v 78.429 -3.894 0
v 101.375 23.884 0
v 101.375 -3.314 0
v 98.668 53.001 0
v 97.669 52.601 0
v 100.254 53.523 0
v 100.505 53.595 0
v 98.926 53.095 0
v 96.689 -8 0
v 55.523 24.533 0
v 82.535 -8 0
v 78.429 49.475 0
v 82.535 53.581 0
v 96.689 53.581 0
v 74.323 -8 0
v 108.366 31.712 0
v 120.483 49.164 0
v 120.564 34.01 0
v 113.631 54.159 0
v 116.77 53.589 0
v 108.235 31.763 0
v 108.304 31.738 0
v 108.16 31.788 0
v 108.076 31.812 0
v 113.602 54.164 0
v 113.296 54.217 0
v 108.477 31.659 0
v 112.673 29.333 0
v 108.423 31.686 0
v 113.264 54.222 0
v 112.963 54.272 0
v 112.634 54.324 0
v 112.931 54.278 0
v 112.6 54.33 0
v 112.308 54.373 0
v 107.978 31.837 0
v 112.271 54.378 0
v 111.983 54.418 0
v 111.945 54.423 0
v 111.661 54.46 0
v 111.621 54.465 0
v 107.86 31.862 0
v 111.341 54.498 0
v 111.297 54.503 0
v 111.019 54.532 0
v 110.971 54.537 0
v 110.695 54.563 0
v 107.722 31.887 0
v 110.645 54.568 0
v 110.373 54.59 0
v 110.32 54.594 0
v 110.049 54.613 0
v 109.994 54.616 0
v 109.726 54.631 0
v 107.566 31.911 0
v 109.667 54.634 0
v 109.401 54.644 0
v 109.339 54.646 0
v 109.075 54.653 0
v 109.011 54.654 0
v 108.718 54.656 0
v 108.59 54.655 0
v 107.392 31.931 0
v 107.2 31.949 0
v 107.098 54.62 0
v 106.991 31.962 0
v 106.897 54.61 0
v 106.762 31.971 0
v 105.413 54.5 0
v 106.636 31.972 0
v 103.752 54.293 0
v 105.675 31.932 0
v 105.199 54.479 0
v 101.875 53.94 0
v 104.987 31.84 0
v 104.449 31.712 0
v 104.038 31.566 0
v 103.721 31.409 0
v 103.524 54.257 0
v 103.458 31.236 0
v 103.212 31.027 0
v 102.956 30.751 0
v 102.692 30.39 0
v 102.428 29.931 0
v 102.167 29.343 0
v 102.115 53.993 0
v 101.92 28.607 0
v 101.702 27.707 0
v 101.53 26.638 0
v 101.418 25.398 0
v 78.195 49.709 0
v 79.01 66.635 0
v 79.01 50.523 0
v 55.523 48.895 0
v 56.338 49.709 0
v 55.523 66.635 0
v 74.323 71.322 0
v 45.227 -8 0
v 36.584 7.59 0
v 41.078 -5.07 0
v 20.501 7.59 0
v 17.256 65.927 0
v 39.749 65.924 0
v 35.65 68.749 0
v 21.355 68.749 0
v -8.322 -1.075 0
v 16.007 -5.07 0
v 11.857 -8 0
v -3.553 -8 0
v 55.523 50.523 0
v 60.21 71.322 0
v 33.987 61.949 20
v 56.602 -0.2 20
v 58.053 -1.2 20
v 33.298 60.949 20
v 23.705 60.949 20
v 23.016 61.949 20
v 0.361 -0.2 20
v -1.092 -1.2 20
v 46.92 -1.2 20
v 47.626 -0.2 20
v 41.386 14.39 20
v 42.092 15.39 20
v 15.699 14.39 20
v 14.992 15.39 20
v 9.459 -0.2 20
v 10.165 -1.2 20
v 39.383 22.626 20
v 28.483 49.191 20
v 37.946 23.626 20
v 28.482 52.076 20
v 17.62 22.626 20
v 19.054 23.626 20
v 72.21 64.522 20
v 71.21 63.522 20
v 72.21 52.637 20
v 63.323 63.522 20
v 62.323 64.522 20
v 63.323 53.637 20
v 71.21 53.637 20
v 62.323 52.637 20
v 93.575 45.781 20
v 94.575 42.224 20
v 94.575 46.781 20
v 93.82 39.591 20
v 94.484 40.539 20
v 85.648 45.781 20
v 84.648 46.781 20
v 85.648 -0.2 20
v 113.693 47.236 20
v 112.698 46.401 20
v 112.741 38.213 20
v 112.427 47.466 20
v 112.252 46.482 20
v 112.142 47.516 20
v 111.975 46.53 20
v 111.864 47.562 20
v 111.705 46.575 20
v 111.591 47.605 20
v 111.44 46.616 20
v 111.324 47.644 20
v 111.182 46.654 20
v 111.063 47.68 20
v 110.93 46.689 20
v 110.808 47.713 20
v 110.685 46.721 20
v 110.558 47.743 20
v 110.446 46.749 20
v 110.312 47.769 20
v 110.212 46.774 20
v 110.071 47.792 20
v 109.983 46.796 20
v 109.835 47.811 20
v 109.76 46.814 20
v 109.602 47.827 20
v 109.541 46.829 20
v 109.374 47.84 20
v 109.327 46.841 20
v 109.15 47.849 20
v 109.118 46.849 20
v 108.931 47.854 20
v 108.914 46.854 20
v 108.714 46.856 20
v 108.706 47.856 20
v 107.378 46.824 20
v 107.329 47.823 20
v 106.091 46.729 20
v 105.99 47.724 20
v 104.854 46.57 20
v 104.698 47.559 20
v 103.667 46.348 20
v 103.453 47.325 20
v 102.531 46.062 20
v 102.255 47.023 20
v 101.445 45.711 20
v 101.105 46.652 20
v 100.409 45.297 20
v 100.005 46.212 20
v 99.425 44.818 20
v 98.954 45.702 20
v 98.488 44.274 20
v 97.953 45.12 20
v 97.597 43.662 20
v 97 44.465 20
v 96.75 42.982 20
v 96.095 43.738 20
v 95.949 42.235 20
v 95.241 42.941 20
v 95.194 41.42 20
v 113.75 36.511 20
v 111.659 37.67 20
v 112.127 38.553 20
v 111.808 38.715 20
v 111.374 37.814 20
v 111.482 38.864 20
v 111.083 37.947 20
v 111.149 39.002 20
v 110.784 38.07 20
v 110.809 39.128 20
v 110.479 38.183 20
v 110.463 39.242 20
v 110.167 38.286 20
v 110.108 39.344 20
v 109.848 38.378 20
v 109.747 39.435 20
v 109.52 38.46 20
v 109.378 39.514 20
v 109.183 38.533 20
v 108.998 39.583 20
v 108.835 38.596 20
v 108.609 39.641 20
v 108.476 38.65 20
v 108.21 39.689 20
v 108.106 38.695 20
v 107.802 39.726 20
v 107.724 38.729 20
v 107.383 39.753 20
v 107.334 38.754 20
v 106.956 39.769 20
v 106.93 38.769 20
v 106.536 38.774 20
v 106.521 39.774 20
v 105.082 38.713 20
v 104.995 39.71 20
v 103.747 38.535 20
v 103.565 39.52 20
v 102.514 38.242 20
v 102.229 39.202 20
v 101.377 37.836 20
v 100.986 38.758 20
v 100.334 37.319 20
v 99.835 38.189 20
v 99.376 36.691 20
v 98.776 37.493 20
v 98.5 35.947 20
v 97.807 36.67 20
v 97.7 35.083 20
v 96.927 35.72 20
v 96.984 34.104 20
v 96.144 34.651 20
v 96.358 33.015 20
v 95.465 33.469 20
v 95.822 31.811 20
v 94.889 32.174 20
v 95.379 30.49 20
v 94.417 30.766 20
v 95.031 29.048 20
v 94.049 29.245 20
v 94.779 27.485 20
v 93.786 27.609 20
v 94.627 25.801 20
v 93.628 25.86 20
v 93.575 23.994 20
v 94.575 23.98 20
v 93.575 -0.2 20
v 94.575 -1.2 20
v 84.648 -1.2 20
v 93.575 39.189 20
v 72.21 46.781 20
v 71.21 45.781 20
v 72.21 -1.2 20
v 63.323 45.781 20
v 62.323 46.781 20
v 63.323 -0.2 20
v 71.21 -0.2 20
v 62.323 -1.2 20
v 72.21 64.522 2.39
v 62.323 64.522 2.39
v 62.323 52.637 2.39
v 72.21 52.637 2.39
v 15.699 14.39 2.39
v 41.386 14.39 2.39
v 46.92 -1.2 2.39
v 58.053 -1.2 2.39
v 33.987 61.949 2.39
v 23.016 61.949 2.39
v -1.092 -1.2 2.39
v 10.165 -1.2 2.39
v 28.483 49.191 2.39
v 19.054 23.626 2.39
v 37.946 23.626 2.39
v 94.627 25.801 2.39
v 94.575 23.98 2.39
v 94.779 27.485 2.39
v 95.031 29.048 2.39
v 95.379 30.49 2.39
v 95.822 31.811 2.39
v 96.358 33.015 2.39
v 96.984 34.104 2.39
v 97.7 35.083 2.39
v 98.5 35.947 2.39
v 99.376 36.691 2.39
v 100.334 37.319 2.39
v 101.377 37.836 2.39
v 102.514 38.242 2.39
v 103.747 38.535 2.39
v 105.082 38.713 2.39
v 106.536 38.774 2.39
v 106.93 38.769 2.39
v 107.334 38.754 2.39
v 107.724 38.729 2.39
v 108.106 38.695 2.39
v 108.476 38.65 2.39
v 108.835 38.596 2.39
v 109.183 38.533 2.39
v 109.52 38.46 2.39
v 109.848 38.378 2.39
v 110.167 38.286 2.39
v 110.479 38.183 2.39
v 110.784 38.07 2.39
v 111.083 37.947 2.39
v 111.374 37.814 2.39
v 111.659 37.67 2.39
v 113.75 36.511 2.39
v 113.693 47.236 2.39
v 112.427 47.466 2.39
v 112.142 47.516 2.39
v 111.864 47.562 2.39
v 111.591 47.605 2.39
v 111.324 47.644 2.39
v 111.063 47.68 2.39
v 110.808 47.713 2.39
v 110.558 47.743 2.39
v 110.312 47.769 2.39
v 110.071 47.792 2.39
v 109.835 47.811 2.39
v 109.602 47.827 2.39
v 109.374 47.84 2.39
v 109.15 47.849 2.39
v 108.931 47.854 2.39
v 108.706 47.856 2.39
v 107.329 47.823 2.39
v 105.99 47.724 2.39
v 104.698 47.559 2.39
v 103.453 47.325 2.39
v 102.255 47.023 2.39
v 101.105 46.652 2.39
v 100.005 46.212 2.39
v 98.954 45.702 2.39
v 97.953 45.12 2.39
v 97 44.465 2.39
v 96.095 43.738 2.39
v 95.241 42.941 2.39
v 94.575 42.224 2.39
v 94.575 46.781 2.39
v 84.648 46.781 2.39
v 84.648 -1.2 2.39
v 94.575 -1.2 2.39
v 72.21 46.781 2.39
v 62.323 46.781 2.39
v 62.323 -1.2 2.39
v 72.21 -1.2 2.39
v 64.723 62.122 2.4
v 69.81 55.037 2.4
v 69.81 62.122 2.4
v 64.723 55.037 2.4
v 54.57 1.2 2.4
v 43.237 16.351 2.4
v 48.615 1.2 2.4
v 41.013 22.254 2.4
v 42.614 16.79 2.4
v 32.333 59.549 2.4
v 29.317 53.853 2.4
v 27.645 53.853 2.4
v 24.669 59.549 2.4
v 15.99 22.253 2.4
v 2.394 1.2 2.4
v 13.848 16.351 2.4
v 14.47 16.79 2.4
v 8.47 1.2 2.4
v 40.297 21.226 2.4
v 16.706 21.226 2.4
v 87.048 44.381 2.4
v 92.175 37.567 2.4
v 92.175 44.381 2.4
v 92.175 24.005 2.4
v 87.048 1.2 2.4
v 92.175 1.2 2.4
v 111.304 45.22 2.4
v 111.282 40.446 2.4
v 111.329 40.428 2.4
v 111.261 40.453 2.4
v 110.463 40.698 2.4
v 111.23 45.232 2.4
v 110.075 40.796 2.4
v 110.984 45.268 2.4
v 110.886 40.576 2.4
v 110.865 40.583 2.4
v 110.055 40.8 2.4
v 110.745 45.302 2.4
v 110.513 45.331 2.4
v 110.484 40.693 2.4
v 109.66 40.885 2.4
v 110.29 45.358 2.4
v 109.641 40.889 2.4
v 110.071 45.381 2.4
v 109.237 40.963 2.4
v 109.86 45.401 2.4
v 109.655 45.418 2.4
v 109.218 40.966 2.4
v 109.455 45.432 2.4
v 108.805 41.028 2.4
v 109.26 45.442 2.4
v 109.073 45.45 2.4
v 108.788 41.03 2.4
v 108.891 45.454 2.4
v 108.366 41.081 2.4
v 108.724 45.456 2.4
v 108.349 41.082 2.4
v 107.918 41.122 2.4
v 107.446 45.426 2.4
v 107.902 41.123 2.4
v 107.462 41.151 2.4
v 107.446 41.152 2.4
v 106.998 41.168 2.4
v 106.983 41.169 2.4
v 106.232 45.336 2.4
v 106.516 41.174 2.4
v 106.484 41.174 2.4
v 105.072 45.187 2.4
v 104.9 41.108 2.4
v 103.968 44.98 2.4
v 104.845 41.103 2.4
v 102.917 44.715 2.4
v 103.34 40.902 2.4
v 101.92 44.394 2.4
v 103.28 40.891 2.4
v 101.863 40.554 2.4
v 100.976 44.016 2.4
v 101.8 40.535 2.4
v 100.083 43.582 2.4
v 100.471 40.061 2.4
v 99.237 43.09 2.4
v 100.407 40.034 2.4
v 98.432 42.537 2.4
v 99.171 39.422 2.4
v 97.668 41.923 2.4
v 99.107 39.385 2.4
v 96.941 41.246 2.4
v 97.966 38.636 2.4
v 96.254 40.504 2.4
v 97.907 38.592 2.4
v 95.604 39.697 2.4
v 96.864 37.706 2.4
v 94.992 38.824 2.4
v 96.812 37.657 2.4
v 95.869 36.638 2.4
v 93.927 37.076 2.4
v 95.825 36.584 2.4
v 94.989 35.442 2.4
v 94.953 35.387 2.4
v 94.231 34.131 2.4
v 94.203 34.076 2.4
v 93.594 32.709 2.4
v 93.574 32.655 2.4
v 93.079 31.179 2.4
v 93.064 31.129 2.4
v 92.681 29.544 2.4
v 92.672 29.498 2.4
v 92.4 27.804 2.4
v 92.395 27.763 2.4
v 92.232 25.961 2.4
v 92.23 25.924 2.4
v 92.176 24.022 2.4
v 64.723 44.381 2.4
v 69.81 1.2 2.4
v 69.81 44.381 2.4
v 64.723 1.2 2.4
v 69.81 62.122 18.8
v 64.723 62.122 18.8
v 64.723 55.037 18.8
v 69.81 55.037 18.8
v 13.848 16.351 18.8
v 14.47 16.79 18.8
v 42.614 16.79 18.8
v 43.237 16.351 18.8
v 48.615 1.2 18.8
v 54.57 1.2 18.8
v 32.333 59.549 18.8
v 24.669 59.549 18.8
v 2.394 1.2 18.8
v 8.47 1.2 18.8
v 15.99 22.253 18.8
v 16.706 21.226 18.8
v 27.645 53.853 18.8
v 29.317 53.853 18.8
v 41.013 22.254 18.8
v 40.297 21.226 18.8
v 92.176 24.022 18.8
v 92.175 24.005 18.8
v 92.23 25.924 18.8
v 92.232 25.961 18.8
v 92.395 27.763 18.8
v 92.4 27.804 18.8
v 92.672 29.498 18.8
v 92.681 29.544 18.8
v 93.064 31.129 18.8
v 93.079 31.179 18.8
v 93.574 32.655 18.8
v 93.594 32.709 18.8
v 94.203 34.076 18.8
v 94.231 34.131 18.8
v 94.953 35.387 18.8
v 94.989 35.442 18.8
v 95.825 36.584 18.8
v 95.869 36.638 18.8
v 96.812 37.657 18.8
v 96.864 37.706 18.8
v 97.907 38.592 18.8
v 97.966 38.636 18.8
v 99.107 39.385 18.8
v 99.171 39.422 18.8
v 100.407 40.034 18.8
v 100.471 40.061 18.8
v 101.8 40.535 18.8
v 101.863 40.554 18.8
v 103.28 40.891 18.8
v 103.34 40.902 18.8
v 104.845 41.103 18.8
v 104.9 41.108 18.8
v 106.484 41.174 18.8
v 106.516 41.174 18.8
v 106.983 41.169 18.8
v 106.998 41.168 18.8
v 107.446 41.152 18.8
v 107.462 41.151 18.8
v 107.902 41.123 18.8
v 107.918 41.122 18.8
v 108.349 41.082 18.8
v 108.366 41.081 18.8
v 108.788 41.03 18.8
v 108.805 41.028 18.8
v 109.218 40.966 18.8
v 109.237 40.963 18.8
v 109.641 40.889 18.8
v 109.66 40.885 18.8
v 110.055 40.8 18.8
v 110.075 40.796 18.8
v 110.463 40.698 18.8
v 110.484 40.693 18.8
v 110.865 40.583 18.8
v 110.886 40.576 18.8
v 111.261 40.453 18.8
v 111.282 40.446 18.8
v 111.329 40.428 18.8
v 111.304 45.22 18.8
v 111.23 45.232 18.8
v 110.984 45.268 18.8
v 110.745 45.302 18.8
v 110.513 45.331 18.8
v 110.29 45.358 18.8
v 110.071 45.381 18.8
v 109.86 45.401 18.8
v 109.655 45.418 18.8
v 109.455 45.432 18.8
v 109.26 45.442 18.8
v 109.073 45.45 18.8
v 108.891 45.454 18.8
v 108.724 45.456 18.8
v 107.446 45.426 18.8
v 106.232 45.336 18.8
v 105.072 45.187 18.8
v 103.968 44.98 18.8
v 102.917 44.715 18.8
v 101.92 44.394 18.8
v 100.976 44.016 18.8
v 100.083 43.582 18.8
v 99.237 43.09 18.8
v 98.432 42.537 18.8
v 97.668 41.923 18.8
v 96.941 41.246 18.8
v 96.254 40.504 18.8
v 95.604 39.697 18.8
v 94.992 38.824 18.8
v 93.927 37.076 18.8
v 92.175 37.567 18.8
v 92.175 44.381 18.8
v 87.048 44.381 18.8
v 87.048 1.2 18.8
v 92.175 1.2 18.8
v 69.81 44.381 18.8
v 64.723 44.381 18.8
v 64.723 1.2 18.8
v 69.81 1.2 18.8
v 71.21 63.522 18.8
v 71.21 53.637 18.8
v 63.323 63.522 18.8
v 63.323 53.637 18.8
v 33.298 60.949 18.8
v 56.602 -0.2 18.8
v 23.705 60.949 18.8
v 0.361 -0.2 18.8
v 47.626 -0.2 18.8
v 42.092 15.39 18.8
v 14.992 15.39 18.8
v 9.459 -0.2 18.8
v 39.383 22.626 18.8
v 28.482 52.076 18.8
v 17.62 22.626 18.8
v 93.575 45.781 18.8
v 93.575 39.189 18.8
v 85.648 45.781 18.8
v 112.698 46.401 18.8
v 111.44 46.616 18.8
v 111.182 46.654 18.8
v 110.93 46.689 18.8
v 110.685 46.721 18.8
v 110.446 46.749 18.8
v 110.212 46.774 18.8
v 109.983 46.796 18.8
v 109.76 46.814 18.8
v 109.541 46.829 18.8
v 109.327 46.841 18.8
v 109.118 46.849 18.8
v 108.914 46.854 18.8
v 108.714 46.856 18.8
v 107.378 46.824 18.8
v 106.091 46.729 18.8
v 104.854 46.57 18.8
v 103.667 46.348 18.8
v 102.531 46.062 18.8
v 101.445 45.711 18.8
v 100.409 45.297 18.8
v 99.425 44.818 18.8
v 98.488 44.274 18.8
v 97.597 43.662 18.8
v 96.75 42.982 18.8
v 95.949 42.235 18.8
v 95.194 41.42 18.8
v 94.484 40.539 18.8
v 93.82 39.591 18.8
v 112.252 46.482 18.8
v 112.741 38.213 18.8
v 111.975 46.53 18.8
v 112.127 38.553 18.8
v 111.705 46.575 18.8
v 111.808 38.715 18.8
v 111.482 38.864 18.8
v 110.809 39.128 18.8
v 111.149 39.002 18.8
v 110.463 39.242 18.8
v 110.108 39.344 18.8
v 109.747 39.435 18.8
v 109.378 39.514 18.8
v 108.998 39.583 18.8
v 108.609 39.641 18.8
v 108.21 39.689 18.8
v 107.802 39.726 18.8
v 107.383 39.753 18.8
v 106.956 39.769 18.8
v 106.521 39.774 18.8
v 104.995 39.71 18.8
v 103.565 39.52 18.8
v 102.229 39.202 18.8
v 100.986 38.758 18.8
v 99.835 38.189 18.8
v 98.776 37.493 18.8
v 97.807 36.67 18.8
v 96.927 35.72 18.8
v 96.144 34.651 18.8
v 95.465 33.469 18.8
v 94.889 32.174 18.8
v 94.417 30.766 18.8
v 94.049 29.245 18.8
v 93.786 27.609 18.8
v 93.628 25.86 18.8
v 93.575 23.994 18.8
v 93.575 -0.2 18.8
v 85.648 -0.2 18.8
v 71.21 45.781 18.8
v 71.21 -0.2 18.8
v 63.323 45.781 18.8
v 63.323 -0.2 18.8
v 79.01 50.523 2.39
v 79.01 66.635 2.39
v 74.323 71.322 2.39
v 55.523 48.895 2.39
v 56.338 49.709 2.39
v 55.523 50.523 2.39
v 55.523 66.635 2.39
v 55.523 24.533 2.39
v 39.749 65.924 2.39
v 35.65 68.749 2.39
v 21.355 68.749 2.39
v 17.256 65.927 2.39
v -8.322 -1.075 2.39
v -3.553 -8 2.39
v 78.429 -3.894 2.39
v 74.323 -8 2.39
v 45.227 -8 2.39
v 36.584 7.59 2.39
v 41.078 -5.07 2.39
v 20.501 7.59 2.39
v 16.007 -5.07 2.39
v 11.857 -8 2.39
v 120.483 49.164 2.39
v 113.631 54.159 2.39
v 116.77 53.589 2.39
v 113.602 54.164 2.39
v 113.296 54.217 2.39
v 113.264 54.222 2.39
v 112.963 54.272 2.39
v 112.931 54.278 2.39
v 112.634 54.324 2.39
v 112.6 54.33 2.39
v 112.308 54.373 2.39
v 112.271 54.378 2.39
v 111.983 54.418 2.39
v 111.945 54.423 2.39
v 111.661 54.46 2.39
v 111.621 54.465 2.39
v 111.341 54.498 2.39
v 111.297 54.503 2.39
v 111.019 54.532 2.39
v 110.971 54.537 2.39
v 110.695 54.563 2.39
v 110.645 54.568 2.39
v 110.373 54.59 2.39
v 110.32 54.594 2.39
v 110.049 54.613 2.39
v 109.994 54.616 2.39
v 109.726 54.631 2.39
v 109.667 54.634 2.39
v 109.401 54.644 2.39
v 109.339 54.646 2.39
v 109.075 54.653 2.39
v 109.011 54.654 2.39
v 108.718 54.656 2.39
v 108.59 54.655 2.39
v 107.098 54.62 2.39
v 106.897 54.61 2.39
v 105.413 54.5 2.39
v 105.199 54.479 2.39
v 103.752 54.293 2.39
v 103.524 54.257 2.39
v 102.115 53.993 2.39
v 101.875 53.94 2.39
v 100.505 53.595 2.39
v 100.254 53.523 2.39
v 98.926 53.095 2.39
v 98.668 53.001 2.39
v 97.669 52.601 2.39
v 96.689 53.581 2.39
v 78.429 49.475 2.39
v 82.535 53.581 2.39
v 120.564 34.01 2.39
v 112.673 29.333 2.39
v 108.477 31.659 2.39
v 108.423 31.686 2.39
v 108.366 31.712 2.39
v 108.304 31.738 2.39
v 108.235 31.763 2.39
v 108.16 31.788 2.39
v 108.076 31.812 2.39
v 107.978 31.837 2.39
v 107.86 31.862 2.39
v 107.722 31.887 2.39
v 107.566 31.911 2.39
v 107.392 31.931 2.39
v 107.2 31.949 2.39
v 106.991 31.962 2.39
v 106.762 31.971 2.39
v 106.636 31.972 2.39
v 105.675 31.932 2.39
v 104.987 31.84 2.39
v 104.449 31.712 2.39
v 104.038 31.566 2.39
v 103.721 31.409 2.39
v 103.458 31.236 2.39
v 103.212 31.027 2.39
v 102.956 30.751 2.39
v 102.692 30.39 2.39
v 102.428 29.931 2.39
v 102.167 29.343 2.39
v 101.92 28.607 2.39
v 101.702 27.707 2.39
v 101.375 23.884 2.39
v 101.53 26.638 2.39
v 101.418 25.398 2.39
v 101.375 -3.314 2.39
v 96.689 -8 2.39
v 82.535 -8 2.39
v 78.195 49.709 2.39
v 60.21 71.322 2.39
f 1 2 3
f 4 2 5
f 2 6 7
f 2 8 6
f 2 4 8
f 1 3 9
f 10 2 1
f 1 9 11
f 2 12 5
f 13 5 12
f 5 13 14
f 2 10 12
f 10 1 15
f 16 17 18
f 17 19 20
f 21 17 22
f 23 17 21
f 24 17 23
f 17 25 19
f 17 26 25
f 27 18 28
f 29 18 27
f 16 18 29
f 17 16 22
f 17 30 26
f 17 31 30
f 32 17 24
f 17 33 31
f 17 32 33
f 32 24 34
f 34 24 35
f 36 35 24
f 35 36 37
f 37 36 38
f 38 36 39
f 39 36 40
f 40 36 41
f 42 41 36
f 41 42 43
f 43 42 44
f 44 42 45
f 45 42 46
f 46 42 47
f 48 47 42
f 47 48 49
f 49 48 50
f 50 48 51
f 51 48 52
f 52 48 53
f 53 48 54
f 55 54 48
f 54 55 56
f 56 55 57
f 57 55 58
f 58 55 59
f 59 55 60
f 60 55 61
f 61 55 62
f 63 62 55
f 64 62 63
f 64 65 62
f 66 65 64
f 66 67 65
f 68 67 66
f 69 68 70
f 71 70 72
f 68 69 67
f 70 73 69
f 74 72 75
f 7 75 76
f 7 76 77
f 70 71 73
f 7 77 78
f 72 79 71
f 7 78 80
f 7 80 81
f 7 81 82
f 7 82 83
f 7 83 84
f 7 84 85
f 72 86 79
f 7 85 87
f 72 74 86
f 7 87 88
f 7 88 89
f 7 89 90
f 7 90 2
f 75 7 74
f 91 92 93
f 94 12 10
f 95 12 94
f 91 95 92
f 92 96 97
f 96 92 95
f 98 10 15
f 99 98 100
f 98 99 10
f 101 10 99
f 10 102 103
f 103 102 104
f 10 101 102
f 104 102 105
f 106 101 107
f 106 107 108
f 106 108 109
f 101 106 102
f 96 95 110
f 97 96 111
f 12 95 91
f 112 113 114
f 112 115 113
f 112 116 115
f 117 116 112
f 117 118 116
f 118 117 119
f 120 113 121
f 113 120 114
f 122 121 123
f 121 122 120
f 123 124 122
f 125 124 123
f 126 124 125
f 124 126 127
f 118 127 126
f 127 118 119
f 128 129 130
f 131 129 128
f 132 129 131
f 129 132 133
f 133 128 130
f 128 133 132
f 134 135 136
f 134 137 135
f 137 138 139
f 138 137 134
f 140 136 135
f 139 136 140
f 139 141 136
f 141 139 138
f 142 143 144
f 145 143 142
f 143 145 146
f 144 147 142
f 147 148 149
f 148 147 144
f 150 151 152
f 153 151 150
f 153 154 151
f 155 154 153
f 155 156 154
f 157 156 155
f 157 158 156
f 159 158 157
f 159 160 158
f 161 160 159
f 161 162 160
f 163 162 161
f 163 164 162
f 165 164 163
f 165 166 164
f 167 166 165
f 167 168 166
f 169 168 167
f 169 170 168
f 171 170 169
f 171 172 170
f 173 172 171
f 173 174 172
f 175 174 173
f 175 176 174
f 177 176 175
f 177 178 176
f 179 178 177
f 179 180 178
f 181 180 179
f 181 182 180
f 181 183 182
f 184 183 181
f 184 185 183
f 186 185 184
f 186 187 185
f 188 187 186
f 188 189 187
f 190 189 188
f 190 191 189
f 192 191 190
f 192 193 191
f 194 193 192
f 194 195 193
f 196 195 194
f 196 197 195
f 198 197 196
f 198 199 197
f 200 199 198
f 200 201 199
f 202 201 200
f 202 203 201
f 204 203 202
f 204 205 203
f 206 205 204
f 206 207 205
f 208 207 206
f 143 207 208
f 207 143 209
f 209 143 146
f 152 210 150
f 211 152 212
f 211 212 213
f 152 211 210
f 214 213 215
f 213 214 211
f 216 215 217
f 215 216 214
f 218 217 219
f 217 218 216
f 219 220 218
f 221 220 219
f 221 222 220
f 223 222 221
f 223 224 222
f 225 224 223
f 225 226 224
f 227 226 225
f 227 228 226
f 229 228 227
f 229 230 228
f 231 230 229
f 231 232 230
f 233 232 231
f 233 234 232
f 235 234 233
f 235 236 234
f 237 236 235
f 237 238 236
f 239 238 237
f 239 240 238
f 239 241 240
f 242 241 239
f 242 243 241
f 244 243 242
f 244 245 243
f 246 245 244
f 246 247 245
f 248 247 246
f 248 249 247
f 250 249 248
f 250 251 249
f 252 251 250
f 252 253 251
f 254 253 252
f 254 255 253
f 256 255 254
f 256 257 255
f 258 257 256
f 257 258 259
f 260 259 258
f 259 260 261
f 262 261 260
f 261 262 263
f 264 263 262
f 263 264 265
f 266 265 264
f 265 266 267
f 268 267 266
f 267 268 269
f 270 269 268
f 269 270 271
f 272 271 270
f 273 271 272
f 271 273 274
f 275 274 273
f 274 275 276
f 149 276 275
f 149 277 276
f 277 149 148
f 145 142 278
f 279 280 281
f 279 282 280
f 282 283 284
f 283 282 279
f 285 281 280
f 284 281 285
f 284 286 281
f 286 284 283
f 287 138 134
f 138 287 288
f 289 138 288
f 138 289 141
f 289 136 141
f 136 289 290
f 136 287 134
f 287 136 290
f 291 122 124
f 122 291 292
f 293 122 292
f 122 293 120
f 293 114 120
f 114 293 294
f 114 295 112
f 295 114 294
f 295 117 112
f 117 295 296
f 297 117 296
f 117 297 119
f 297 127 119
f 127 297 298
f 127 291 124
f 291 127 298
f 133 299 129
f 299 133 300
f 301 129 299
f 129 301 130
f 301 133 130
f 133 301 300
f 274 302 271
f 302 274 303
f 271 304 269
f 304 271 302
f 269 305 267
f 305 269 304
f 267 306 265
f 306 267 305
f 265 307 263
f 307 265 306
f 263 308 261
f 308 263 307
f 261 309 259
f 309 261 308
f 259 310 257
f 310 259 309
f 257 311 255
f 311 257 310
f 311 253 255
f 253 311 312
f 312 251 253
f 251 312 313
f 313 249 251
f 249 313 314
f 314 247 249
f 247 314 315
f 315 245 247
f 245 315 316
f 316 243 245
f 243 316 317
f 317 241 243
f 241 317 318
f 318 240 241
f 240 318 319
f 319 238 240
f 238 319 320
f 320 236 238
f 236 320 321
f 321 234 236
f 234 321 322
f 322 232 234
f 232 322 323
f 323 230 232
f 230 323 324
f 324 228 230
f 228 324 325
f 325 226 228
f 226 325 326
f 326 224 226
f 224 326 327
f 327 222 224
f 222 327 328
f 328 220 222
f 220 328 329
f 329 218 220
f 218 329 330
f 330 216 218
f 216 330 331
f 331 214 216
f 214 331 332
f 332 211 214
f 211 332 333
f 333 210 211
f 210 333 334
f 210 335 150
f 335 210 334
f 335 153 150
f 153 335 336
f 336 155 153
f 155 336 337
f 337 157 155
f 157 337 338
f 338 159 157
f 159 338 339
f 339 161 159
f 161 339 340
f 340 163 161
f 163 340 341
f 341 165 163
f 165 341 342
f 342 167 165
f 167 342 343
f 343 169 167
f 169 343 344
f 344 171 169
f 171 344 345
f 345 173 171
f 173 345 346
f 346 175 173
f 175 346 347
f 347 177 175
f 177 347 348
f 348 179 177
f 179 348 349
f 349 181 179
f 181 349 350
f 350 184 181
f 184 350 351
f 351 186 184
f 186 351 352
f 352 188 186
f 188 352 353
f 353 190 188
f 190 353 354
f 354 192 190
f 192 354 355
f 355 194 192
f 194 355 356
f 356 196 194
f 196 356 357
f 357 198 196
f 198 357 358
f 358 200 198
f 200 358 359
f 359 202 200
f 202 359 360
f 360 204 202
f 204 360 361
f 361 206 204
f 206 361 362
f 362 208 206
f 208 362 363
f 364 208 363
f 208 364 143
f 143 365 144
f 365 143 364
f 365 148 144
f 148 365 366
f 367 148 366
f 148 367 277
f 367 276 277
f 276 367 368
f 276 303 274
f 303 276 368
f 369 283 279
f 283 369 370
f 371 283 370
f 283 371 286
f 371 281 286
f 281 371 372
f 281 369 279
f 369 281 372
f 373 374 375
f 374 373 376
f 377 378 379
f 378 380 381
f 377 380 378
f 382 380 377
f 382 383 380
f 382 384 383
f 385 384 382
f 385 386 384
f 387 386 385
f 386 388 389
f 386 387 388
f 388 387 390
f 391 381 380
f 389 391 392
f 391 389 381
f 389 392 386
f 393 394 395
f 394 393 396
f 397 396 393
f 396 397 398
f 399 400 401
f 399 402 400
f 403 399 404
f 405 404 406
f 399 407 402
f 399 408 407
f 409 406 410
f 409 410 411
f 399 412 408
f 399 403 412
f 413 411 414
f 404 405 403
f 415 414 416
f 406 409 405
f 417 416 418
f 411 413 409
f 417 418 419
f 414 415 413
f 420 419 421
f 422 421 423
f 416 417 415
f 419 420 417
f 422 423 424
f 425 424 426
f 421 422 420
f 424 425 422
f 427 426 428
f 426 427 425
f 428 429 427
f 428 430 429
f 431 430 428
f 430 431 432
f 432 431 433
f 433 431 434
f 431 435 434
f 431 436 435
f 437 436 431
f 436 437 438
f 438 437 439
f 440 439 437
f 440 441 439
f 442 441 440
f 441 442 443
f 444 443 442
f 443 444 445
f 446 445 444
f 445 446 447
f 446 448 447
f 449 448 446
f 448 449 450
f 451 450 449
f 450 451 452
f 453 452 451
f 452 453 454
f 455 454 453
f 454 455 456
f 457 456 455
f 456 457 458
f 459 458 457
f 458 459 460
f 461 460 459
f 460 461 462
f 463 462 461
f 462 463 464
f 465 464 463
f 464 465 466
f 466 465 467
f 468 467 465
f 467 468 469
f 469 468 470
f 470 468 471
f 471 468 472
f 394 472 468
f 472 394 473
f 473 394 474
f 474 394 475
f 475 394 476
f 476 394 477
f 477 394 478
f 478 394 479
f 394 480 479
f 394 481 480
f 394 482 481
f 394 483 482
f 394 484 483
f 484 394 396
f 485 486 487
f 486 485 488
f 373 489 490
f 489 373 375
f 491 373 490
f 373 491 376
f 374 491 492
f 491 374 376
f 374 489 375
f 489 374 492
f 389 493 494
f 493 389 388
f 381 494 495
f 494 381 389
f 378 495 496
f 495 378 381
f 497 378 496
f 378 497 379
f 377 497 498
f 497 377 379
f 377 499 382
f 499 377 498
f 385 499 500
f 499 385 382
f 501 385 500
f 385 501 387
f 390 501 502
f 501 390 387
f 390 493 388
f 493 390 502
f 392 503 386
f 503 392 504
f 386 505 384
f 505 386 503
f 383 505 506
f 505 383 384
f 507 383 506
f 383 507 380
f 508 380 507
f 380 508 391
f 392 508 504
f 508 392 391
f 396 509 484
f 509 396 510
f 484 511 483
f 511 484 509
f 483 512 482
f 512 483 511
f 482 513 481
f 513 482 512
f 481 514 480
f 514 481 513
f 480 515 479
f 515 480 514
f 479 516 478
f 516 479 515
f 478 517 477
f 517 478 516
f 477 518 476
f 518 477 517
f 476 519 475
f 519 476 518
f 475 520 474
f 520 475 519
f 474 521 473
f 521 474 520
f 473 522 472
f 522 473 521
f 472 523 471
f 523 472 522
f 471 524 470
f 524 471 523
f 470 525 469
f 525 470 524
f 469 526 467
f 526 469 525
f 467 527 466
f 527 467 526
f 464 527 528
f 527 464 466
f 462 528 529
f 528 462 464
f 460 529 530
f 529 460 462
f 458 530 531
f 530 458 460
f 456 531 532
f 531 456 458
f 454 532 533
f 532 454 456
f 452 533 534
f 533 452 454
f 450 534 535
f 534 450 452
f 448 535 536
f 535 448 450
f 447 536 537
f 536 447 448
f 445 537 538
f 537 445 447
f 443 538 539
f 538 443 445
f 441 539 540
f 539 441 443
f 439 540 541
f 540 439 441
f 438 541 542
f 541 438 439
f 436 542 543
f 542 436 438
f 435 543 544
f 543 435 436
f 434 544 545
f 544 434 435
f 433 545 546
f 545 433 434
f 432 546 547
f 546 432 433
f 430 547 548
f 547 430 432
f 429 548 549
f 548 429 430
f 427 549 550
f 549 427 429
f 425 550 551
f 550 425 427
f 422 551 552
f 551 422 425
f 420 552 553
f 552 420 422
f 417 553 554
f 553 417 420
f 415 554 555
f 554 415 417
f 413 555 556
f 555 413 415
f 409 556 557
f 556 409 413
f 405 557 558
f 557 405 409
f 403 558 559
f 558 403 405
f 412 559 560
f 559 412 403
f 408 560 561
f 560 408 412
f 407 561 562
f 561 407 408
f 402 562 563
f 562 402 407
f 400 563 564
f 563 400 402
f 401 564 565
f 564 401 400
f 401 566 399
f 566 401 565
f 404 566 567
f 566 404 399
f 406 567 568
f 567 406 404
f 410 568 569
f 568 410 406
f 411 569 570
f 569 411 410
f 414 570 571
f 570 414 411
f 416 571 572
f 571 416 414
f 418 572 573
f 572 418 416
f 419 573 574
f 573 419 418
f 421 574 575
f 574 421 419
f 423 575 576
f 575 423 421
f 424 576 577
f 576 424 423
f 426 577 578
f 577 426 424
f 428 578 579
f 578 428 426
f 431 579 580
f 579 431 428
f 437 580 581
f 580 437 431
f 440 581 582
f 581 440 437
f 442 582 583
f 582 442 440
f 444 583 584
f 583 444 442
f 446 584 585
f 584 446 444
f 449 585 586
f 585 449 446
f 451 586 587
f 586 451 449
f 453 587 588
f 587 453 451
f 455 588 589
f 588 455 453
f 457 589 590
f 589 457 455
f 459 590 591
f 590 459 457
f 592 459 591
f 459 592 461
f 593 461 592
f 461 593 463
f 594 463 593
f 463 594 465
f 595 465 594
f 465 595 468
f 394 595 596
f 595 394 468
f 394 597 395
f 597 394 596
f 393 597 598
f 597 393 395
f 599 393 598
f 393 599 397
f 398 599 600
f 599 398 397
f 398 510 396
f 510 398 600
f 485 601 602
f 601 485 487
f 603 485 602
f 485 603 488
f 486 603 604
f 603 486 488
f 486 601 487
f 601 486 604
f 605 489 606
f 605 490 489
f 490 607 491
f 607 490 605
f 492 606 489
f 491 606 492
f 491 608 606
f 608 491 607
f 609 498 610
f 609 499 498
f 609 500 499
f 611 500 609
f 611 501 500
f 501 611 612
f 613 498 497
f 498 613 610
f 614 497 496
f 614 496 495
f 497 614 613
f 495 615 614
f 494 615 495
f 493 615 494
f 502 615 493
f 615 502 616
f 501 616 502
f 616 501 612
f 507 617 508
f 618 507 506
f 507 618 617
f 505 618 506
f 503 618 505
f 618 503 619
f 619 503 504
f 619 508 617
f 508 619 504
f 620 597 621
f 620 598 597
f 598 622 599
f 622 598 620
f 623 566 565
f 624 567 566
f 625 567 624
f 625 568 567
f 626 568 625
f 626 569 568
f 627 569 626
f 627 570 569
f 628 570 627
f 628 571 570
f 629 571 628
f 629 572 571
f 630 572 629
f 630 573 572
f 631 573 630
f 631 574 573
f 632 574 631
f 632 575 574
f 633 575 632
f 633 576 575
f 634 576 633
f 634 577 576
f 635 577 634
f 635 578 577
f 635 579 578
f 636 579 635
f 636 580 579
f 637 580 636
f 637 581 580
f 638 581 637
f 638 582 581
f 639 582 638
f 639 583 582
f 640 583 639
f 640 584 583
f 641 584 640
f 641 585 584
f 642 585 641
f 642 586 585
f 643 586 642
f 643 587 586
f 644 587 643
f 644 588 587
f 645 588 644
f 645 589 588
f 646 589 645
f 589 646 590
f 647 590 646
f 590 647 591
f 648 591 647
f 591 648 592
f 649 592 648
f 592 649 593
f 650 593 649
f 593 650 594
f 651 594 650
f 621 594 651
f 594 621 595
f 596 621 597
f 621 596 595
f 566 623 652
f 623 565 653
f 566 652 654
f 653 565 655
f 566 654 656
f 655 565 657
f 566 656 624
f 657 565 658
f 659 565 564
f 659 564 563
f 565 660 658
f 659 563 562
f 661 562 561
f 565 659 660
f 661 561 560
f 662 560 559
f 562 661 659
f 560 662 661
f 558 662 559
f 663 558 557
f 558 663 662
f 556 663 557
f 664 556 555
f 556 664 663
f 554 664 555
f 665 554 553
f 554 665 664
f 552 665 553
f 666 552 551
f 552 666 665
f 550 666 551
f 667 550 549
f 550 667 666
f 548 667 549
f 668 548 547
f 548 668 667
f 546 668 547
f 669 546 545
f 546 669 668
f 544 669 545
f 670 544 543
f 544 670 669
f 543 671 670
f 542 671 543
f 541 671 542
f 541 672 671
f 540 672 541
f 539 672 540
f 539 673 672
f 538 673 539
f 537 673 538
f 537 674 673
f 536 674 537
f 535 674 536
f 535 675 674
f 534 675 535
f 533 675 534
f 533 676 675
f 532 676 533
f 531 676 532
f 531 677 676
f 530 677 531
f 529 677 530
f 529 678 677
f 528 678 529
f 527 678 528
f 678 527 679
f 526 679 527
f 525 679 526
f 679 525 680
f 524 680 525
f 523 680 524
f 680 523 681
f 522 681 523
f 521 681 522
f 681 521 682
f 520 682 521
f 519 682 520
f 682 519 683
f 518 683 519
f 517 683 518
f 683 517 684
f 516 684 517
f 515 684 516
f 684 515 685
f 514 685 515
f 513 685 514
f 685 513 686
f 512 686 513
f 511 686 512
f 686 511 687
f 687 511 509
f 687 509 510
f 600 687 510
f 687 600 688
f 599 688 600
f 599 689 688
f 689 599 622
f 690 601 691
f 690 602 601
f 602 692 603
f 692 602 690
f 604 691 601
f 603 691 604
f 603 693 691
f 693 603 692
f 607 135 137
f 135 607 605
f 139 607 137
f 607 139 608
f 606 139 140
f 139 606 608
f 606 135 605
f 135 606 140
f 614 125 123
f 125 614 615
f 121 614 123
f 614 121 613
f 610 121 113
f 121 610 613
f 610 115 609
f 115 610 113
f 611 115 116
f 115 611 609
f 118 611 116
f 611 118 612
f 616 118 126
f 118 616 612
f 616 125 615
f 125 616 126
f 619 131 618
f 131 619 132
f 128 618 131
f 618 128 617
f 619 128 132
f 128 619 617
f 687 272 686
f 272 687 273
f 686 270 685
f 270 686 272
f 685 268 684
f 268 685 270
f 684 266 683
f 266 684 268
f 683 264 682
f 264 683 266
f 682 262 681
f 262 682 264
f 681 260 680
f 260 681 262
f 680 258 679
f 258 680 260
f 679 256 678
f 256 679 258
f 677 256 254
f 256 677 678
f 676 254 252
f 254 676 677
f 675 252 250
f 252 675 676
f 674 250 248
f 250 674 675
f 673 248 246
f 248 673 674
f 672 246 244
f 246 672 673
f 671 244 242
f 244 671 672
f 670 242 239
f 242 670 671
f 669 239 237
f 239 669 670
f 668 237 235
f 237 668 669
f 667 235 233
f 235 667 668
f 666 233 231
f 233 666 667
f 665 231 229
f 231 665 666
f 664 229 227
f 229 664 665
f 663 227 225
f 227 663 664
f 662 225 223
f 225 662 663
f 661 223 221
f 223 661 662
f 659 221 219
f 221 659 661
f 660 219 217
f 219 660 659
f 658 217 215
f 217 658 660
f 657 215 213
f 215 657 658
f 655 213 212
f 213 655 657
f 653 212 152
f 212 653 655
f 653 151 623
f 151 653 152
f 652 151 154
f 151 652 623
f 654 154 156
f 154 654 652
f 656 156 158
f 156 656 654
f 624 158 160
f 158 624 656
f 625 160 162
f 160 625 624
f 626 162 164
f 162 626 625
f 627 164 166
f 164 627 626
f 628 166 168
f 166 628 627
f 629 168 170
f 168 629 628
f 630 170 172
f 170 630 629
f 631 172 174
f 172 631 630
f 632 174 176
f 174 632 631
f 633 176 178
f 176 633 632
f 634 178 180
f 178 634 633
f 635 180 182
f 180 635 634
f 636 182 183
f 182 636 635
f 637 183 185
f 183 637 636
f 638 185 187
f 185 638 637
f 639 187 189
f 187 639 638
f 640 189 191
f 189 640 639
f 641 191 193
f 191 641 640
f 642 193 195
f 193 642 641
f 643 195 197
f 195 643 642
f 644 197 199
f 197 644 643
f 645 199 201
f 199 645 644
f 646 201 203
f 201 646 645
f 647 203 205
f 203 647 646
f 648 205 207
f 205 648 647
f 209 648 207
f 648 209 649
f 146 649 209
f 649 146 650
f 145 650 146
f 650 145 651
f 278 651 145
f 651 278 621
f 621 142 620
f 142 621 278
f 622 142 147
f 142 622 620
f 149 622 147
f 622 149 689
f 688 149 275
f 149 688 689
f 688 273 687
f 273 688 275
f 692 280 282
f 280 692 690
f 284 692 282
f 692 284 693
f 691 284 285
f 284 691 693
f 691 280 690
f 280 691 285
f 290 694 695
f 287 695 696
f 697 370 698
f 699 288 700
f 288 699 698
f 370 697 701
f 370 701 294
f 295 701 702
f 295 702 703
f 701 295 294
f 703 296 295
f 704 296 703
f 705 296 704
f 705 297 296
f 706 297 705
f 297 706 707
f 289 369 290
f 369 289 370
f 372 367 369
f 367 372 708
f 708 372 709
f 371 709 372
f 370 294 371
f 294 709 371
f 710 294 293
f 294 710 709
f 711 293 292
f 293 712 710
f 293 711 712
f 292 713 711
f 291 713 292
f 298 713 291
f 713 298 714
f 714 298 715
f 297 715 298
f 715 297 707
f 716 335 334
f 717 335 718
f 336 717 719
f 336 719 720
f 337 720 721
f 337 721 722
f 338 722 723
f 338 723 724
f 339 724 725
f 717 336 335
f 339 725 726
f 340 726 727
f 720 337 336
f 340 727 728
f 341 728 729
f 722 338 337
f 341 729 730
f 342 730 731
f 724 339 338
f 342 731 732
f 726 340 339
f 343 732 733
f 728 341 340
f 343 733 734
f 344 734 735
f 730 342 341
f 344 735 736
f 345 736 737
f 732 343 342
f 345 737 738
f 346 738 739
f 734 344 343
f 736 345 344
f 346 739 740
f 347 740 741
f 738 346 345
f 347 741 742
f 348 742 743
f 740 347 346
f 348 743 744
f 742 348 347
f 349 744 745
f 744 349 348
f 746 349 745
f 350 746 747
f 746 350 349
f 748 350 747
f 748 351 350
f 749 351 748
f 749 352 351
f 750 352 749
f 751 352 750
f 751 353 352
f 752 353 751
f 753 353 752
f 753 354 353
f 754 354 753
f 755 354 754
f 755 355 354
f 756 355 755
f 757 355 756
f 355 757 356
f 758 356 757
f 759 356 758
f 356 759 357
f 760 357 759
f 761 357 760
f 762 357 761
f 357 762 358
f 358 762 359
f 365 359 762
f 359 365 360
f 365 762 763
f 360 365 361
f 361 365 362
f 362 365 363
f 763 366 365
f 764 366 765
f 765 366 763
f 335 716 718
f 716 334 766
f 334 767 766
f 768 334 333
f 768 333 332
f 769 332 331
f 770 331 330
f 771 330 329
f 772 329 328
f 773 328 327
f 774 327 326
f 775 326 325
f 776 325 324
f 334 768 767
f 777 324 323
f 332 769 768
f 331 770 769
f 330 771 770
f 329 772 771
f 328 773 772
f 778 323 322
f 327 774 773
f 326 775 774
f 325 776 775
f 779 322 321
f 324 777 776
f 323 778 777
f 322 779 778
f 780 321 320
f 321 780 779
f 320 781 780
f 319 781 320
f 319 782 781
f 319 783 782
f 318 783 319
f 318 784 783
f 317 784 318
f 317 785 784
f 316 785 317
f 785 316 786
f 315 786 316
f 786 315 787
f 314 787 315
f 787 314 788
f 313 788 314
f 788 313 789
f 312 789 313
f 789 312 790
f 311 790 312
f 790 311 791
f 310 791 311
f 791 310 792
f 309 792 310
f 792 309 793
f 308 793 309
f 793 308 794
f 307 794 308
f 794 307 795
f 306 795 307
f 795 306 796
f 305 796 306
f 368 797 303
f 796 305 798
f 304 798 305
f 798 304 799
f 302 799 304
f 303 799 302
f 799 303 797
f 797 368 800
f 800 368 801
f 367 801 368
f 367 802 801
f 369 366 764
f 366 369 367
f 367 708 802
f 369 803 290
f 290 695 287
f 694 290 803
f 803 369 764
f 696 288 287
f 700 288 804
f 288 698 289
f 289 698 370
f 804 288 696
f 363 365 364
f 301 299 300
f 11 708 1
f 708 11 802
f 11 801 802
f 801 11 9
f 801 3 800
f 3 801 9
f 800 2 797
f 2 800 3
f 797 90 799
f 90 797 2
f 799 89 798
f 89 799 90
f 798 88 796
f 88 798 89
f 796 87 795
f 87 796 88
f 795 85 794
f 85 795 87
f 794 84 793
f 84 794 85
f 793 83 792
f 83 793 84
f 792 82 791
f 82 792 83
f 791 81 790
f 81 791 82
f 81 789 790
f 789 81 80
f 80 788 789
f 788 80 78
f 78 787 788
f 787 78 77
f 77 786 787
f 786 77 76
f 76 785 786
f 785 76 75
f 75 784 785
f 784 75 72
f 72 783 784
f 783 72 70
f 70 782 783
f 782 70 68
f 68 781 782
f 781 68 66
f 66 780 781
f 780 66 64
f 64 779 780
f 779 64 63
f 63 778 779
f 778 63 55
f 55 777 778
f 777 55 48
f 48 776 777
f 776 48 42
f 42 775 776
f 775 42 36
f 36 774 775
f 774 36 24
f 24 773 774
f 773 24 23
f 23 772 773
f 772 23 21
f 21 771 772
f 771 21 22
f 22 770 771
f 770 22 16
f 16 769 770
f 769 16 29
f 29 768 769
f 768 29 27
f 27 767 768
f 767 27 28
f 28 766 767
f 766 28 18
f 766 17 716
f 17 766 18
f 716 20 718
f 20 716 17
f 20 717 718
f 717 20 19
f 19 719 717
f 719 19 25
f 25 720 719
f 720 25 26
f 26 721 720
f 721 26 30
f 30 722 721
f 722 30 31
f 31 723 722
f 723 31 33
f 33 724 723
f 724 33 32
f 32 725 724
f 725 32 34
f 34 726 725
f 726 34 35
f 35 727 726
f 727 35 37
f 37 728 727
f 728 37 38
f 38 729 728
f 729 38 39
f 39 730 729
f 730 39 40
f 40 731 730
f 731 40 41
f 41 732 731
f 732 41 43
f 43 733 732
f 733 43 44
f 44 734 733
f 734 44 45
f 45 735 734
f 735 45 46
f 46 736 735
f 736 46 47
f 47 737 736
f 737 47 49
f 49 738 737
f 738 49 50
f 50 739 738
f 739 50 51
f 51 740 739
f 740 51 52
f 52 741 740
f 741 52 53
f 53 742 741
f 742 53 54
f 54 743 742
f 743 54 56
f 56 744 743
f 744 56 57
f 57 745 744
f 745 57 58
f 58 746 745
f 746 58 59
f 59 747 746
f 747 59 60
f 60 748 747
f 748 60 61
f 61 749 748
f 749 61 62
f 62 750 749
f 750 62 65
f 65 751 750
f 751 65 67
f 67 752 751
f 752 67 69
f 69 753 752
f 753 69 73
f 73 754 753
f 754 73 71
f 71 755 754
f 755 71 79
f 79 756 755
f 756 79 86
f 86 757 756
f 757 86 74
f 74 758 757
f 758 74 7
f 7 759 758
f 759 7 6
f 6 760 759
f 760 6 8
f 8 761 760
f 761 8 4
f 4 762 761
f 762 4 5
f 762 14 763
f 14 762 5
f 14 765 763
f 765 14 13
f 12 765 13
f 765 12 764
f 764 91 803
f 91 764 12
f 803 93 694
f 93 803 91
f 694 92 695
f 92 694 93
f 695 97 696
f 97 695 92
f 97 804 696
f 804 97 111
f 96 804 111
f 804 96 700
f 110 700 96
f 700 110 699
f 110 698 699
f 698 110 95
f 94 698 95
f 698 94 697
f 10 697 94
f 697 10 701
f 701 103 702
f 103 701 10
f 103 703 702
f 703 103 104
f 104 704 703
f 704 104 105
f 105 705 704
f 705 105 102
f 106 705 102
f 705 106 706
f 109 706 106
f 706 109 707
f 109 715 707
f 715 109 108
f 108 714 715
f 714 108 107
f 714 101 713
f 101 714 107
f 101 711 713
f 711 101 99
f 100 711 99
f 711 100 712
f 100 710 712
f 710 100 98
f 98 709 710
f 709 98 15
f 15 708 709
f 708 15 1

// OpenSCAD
// file: include/signmaker.scad
// OpenSCAD LED signmaker
// to be included in own OpenSCAD scripts
// inspired by BigClive's livestream from 2022-06-11.

module signbodyio(h=10, wi=1.2, wo=1.2, fl=1.2, fh=1.2, pl=0.2, incha=true) {
    pf=0.001;
    difference() {
        linear_extrude(height=h)
            offset(delta=wo)
                children();
        translate([0,0,fl])
            linear_extrude(height=h-fl+pf)
                offset(delta=-wi, chamfer=incha)
                    children();
        translate([0,0,h-fh])
            linear_extrude(height=h)
                offset(delta=pl)
                    children();
    }
}

module signbody(h=10, ww=2.4, fl=1.2, fh=1.2, pl=0.2, incha=true) {
    signbodyio(h=h, wi=ww/2, wo=ww/2, fl=fl, fh=fh, pl=pl, incha=incha)
        children();
}

module signface(fh=1.2) {
    linear_extrude(height=fh)
        children();
}

module makesignio(h=10, wi=1.2, wo=1.2, fl=1.2, fh=1.2, pl=0.2, incha=true, face=false) {
    if(face)
        signface(fh=fh)
            children();
    else
        signbodyio(h=h, wi=wi, wo=wo, fl=fl, fh=fh, pl=pl)
            children();
}

module makesign(h=10, ww=2.4, fl=1.2, fh=1.2, pl=0.2, incha=true, face=false) {
    makesignio(h=h, wi=ww/2, wo=ww/2, fl=fl, fh=fh, pl=pl, incha=incha, face=face)
        children();
}
// main file
// OpenSCAD sign maker (text sign with brim)
//
// Inspried by script in description of
// BigClive's livestream from 2022-06-11.
//
//
// Select the font name from the list of available fonts:
// Menu: "Help" > "Font List"
//

//Text to render
text="Air";

//Font to use
//here: DayPosterBlack by Nick Curtis
//https://www.nicksfonts.com/
//https://www.dafont.com/nicks-fonts.d83

font="DayPosterBlack:style=Regular";

//Text size
size=60;

//Text spacing
space=1.0;

//Height of the sign body
h=20;

//Wall width
ww=2.4;

//Floor height (set to -1 for open base)
fl=2.4;

//Face height
fh=1.2;

//Play for fitting face
pl=0.2;

//Create face (true) or body (false)
face=false;

//brim width to hold letters together
brim=8;

///////////////////////////
$fn=60;

pf=0.01;

include <include/signmaker.scad>;

makesign(h=h, ww=ww, fl=fl, fh=fh, pl=pl, face=face) {
    text(text, font=font, size=size, spacing=space);
}
if(!face) {
    linear_extrude(fl-pf)
        offset(delta=brim, chamfer=true)
            text(text, font=font, size=size, spacing=space);
}
